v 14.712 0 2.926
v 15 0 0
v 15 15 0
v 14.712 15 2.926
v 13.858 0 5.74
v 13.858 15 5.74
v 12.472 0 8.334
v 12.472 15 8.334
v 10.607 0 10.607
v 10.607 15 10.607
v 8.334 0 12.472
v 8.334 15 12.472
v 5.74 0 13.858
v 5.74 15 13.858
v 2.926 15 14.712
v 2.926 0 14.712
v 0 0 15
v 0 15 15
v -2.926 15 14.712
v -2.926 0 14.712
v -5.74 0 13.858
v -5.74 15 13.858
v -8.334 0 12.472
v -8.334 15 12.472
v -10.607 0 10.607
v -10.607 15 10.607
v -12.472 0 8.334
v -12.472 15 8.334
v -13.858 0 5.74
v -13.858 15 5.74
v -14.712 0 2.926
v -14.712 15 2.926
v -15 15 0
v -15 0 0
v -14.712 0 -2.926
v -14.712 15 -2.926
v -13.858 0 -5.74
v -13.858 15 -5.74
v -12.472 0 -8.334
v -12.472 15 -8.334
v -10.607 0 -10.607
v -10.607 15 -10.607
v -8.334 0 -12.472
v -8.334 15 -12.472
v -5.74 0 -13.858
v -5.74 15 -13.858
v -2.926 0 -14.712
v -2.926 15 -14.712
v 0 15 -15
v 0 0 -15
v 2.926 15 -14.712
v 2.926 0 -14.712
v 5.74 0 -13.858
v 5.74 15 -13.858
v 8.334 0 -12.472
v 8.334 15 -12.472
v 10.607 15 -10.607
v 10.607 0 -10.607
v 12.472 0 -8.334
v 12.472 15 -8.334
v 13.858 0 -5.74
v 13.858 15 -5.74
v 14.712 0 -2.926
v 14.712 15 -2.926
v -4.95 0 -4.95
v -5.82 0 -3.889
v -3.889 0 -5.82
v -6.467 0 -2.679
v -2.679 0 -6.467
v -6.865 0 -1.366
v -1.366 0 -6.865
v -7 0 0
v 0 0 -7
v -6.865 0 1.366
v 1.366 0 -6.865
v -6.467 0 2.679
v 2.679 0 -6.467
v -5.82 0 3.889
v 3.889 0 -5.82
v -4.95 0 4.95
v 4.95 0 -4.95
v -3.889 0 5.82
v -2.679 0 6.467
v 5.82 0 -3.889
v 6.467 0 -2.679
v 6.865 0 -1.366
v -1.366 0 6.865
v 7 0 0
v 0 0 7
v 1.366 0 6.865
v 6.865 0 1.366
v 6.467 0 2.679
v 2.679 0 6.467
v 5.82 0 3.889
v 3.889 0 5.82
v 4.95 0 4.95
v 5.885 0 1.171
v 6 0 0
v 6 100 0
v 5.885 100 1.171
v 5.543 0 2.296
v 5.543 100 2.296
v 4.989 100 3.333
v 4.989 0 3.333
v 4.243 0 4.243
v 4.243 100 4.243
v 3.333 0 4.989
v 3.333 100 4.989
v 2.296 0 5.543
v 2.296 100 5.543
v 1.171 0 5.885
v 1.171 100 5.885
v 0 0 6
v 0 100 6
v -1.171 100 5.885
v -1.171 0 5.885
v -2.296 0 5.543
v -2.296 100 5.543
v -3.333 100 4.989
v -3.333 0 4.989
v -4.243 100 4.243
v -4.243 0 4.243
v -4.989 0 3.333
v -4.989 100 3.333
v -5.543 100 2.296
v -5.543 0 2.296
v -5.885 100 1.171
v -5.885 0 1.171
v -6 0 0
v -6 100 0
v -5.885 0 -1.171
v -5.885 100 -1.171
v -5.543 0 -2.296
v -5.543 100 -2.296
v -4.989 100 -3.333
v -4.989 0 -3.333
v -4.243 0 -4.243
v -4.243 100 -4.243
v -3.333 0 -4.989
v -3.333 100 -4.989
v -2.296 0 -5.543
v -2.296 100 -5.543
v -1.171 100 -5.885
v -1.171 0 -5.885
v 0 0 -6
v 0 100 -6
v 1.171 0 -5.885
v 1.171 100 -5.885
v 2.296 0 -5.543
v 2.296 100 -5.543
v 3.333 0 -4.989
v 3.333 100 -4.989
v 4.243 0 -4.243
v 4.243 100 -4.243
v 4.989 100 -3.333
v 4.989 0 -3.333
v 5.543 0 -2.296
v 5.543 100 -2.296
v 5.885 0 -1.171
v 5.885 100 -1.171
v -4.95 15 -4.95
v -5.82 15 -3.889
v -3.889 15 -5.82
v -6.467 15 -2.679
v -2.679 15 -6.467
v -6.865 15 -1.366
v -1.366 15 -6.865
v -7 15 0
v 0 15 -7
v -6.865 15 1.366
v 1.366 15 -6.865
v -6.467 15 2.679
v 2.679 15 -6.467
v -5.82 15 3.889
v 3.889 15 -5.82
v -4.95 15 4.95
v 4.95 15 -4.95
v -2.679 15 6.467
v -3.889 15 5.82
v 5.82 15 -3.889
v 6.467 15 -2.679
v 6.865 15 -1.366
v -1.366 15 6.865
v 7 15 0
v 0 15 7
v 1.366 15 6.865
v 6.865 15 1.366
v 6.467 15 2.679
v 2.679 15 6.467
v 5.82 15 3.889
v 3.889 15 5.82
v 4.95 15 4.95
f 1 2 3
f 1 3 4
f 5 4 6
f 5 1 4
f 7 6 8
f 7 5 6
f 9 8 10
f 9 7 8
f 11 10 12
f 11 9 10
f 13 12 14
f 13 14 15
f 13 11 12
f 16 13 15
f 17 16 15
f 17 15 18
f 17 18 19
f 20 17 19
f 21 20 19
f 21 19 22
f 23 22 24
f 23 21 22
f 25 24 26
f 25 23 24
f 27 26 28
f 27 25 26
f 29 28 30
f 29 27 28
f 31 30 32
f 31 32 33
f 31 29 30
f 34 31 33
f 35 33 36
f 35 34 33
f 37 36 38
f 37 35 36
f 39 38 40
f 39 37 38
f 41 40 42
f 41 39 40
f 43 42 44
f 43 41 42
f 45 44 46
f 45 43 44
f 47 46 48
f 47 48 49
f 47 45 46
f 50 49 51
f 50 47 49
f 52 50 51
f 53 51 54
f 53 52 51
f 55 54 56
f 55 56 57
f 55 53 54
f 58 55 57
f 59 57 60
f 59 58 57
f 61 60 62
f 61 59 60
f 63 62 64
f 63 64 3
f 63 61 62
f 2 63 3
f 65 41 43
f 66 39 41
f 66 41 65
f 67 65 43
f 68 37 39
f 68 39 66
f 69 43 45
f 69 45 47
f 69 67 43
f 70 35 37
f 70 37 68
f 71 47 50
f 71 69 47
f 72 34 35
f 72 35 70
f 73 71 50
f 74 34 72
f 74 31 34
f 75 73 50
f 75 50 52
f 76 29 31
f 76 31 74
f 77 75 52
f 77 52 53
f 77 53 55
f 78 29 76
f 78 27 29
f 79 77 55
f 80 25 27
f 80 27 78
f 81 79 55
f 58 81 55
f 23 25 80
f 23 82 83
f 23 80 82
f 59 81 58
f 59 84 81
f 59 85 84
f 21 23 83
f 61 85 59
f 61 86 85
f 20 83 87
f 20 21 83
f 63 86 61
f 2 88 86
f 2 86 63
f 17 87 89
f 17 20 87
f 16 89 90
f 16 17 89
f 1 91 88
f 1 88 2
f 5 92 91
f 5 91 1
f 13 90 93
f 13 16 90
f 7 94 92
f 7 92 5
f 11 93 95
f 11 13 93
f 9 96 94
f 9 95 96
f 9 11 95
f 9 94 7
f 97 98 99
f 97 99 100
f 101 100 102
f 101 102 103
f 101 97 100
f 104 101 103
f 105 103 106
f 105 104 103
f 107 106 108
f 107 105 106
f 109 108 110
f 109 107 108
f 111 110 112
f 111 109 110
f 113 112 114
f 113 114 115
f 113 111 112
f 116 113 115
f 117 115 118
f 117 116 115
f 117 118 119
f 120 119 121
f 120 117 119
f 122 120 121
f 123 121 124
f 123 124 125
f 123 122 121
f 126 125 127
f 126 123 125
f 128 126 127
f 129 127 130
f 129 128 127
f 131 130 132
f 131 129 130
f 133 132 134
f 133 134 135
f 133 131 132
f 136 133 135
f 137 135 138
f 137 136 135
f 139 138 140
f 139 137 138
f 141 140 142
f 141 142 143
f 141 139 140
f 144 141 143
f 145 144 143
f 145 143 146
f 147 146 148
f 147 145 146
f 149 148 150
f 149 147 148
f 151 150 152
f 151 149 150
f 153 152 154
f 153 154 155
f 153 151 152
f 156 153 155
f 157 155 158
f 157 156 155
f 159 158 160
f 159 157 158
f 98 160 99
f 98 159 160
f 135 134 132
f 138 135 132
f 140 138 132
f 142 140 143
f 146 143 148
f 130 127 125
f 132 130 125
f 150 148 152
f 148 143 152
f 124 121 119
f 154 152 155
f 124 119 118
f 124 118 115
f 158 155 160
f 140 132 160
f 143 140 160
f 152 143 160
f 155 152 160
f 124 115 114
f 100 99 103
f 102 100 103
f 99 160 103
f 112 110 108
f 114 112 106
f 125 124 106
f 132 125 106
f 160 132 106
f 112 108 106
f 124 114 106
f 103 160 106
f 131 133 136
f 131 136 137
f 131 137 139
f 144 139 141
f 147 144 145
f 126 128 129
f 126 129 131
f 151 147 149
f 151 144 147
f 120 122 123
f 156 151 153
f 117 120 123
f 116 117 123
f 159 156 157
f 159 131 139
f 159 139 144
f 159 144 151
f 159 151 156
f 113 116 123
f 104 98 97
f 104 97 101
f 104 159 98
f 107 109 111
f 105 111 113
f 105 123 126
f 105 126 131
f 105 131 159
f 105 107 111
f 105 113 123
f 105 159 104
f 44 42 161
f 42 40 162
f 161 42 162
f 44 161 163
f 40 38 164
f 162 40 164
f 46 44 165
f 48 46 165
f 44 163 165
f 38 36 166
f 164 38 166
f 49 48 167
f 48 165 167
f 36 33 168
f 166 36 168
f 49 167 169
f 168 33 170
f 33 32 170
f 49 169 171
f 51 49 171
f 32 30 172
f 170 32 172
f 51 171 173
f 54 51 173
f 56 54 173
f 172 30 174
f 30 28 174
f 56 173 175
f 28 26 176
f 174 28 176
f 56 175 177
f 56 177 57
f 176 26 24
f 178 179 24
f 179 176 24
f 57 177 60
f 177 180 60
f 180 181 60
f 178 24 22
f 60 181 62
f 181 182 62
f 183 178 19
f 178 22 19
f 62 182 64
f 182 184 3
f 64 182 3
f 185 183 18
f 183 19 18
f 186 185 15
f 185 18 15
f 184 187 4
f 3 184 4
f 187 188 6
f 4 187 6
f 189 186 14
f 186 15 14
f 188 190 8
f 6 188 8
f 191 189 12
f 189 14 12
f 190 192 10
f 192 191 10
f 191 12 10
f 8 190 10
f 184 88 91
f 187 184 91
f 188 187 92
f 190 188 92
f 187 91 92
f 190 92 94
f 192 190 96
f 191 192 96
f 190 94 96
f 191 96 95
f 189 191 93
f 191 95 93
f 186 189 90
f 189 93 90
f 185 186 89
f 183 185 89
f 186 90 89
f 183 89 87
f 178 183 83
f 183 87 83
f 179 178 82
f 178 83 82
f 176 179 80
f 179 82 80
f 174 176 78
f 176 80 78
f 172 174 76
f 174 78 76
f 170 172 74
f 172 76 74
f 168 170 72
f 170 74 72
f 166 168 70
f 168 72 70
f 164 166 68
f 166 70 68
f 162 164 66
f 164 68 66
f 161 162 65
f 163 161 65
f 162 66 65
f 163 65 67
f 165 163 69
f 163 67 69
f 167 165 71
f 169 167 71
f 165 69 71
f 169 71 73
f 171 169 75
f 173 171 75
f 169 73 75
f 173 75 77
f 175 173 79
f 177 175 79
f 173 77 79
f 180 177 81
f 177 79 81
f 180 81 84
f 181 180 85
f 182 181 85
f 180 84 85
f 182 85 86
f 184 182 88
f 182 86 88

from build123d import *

# Parameters (mm, degrees)
F0_R     = 6
F1_DEPTH = 100
F2_R     = 15
F2_R_2   = 7
F3_DEPTH = 15


with BuildPart() as f1:
    # F0 (on Front) → F1 (new body)
    with BuildSketch(Plane.XZ):
        Circle(F0_R)
    extrude(amount=-F1_DEPTH)


with BuildPart() as f3:
    # F2 (on face) → F3 (new body)
    with BuildSketch(Plane.XZ):
        Circle(F2_R)
        Circle(F2_R_2, mode=Mode.SUBTRACT)
    extrude(amount=-F3_DEPTH)


solid = Compound([f1.part, f3.part])
